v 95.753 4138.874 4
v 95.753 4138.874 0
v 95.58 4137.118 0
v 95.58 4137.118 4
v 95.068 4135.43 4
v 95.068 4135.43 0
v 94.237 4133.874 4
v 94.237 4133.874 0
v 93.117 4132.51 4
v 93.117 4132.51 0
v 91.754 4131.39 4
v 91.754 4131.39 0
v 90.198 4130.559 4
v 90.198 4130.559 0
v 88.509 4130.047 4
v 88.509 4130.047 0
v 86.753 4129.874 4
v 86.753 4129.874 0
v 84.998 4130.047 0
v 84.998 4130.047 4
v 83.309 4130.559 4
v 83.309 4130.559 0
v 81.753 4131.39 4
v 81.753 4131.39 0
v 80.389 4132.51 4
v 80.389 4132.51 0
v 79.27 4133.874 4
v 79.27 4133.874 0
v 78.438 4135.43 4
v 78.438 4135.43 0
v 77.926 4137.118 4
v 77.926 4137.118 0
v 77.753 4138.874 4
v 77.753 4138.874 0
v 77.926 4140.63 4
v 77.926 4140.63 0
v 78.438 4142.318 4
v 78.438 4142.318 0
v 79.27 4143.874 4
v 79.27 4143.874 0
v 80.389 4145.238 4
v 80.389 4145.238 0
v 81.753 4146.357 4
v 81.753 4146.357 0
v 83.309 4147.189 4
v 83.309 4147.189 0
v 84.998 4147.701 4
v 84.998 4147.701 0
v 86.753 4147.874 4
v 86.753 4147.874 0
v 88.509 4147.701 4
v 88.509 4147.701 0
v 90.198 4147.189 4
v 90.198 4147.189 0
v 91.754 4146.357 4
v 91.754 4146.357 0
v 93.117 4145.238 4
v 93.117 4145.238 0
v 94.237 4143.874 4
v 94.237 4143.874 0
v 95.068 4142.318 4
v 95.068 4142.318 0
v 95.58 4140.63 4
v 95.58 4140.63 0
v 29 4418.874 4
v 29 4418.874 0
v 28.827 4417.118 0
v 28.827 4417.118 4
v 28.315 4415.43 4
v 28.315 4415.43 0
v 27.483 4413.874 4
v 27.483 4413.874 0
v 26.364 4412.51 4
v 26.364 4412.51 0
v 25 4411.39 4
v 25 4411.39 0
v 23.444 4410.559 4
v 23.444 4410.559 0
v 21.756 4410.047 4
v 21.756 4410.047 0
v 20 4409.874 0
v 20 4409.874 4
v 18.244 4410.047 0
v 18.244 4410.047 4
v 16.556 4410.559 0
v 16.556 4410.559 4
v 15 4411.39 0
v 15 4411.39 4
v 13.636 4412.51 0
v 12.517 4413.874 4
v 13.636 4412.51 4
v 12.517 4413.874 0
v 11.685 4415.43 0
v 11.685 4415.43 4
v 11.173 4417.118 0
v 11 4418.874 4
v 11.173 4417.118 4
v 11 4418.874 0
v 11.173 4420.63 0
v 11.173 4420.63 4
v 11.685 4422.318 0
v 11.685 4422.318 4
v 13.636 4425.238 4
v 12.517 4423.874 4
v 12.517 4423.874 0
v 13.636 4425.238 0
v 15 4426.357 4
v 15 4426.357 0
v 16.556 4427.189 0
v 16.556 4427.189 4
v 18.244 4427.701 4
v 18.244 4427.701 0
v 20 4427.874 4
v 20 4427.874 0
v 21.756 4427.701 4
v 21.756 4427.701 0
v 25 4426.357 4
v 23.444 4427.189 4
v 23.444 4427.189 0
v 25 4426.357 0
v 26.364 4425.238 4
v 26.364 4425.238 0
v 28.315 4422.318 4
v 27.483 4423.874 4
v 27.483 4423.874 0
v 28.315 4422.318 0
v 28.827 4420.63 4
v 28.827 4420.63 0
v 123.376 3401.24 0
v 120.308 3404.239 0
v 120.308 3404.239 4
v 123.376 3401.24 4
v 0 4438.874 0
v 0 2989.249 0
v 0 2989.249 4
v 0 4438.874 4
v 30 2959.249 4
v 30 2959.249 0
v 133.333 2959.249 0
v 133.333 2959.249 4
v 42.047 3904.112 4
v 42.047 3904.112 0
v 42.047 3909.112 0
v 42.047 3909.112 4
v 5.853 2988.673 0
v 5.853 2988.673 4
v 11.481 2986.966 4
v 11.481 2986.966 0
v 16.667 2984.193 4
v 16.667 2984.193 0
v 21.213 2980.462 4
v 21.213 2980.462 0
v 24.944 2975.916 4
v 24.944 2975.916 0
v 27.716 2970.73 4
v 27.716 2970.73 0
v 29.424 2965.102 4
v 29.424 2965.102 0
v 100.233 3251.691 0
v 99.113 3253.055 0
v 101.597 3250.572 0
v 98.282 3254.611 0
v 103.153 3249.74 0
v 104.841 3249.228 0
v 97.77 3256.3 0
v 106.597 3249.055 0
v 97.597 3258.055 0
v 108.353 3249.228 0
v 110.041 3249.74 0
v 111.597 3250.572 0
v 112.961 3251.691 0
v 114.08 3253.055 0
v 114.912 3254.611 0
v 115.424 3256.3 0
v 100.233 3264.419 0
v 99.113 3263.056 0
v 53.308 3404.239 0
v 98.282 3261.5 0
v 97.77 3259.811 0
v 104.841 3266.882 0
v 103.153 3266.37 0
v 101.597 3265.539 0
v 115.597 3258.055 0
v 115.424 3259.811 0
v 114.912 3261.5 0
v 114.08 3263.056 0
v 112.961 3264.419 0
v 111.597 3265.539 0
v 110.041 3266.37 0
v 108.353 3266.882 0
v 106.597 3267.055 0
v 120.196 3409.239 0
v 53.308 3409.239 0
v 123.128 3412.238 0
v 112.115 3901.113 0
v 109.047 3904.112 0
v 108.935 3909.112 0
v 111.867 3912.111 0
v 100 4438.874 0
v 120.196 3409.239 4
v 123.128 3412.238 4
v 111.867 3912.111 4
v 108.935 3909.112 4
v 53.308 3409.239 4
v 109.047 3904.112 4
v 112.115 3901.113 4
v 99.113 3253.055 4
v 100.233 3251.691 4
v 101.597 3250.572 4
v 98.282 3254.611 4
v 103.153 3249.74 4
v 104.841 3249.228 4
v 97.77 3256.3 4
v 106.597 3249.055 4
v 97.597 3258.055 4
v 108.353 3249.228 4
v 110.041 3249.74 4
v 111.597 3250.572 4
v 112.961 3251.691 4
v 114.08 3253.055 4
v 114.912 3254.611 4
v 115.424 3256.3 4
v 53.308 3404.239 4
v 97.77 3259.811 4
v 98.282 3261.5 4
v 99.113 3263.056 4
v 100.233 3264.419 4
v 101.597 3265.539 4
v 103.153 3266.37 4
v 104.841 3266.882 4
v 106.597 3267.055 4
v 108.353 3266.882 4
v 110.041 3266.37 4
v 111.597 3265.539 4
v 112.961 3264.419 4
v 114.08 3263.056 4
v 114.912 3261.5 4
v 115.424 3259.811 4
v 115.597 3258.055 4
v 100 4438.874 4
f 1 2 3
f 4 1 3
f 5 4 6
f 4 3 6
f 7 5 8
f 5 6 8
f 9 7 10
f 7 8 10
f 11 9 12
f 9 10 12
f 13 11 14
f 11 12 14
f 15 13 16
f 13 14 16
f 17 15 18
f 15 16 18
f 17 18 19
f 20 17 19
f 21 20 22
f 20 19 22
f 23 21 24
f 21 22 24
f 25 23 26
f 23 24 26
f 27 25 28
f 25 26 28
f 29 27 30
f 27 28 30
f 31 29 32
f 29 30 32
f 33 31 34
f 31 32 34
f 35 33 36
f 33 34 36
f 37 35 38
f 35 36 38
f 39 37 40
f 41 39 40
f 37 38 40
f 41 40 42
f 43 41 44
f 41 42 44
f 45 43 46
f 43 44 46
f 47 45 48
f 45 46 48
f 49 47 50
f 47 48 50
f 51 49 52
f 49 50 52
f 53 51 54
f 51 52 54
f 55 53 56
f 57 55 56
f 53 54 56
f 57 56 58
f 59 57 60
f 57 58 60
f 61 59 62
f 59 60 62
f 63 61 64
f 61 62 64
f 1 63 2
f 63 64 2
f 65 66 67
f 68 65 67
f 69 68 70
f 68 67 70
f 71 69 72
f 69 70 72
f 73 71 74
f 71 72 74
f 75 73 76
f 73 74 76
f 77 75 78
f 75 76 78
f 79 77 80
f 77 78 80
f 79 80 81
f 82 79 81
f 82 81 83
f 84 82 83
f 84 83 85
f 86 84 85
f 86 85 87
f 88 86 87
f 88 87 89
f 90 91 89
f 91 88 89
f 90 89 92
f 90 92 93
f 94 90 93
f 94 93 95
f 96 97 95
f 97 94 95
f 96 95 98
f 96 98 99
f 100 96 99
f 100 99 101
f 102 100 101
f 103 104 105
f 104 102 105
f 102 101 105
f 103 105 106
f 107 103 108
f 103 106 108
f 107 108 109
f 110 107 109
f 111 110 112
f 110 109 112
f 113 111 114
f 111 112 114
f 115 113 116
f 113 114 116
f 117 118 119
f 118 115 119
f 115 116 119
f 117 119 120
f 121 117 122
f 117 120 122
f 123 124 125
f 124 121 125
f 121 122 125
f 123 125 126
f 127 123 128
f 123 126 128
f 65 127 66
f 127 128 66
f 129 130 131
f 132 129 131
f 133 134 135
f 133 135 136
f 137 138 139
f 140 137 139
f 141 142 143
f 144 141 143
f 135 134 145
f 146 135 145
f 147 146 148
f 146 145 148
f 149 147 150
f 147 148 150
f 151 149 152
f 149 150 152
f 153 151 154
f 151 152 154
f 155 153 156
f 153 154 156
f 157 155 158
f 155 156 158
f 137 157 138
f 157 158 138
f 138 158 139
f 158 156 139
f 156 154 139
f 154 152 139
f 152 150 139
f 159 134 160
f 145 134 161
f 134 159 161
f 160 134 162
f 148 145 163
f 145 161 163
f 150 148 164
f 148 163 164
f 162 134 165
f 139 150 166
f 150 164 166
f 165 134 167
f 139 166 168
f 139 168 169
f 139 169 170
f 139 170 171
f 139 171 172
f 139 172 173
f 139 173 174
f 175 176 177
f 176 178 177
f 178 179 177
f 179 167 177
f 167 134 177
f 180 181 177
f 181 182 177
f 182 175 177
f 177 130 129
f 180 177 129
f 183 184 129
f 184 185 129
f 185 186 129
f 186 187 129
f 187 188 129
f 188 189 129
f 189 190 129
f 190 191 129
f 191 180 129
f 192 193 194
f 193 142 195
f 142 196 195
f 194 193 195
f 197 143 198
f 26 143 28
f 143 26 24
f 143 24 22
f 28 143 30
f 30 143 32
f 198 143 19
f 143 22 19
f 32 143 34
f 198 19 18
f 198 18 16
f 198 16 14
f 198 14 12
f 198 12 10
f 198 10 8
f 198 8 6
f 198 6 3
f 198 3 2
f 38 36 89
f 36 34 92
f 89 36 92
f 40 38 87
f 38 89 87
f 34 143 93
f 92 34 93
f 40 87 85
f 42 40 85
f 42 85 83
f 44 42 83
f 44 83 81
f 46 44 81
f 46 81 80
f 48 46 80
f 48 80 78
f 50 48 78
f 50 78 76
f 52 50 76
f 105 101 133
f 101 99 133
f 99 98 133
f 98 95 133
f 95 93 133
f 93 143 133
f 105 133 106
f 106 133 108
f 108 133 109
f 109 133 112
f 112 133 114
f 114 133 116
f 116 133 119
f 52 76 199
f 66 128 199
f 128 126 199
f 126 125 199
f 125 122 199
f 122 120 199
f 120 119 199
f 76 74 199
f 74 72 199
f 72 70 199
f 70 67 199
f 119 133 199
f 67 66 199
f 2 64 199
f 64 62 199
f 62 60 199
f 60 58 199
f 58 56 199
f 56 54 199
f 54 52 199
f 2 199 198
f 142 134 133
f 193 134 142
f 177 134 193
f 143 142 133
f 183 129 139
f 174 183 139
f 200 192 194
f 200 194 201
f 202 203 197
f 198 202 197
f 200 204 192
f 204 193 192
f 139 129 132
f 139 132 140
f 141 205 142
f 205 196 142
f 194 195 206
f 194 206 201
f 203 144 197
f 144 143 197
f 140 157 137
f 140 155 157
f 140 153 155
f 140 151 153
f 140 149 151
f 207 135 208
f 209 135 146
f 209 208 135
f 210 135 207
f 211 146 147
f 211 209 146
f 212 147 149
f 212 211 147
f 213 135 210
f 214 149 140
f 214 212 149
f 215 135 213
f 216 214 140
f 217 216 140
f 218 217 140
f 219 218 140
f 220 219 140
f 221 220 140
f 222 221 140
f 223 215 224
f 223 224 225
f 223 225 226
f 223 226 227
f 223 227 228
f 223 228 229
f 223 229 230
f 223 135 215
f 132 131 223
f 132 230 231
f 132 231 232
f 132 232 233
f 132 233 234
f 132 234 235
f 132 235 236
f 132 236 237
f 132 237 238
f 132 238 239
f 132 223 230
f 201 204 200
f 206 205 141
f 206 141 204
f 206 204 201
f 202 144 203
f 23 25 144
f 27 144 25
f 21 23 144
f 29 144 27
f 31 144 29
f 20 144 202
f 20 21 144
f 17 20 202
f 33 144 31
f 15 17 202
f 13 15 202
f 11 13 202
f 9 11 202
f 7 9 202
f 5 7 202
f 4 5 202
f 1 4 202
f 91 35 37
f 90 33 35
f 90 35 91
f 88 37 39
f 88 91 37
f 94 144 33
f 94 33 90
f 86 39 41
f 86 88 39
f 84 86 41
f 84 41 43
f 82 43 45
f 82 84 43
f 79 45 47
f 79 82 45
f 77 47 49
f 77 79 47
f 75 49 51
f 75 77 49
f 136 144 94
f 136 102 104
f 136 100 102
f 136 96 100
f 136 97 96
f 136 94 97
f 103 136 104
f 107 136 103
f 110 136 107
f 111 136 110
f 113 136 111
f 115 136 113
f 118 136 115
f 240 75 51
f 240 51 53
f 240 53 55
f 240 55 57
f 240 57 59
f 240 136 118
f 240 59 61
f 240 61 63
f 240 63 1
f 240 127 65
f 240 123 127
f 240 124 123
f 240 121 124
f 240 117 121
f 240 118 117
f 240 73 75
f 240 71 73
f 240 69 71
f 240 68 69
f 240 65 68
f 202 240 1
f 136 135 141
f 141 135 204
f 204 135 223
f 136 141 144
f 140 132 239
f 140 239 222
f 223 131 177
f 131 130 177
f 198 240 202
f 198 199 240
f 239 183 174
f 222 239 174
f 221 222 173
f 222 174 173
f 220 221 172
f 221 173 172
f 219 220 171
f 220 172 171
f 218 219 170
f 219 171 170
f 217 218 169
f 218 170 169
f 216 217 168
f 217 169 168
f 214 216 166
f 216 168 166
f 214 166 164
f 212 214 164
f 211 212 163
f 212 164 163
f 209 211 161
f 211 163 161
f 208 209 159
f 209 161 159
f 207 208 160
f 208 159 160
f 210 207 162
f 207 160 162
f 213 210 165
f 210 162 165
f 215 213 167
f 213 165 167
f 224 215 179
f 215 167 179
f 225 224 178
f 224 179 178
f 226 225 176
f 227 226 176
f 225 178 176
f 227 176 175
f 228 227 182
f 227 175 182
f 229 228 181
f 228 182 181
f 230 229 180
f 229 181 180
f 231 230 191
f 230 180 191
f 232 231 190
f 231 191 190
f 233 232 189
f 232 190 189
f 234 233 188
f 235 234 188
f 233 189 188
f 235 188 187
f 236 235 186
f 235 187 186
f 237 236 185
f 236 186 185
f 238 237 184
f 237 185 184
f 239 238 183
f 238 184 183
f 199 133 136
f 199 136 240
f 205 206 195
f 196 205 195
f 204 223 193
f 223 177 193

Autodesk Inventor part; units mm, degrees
ref_plane "YZ Plane" through (0, 0, 0) normal (1, 0, 0) x (0, 1, 0)
ref_plane "XZ Plane" through (0, 0, 0) normal (0, 1, 0) x (-1, 0, 0)
ref_plane "XY Plane" through (0, 0, 0) normal (0, 0, 1) x (1, 0, 0)
sketch "Sketch1" plane through (0, 0, 0) normal (0, 0, 1) x (1, 0, 0)
  line L0 (0, 0) -> (0, 4438.8737)
  line L1 (0, 4438.8737) -> (100, 4438.8737)
  line L2 (100, 4438.8737) -> (200, 0)
  line L3 (200, 0) -> (0, 0)
  circle A0 centre (0, 0) radius 30
  line L4 (0, 1479.6246) -> (166.6667, 1479.6246)
  line L5 (0, 2959.2492) -> (133.3333, 2959.2492)
  circle A1 centre (0, 1479.6246) radius 30
  circle A2 centre (0, 2959.2492) radius 30
  line L6 (190.8761, 405) -> (120.8761, 405)
  line L7 (120.8761, 405) -> (120.8761, 410)
  line L8 (120.8761, 410) -> (190.8761, 410)
  line L9 (190.8761, 410) -> (190.8761, 405)
  line L10 (109.6148, 909.8732) -> (179.6148, 909.8732)
  line L11 (179.6148, 904.8732) -> (109.6148, 904.8732)
  line L12 (109.6148, 904.8732) -> (109.6148, 909.8732)
  line L13 (179.6148, 909.8732) -> (179.6148, 904.8732)
  line L14 (98.3535, 1409.7463) -> (168.3535, 1409.7463)
  line L15 (168.3535, 1404.7463) -> (98.3535, 1404.7463)
  line L16 (98.3535, 1404.7463) -> (98.3535, 1409.7463)
  line L17 (168.3535, 1409.7463) -> (168.3535, 1404.7463)
  line L18 (87.0923, 1909.6195) -> (157.0923, 1909.6195)
  line L19 (157.0923, 1904.6195) -> (87.0923, 1904.6195)
  line L20 (87.0923, 1904.6195) -> (87.0923, 1909.6195)
  line L21 (157.0923, 1909.6195) -> (157.0923, 1904.6195)
  line L22 (75.831, 2409.4927) -> (145.831, 2409.4927)
  line L23 (145.831, 2404.4927) -> (75.831, 2404.4927)
  line L24 (75.831, 2404.4927) -> (75.831, 2409.4927)
  line L25 (145.831, 2409.4927) -> (145.831, 2404.4927)
  line L26 (64.5698, 2909.3658) -> (134.5698, 2909.3658)
  line L27 (134.5698, 2904.3658) -> (64.5698, 2904.3658)
  line L28 (64.5698, 2904.3658) -> (64.5698, 2909.3658)
  line L29 (134.5698, 2909.3658) -> (134.5698, 2904.3658)
  line L30 (53.3085, 3409.239) -> (123.3085, 3409.239)
  line L31 (123.3085, 3404.239) -> (53.3085, 3404.239)
  line L32 (53.3085, 3404.239) -> (53.3085, 3409.239)
  line L33 (123.3085, 3409.239) -> (123.3085, 3404.239)
  line L34 (42.0472, 3909.1122) -> (112.0472, 3909.1122)
  line L35 (112.0472, 3904.1122) -> (42.0472, 3904.1122)
  line L36 (42.0472, 3904.1122) -> (42.0472, 3909.1122)
  line L37 (112.0472, 3909.1122) -> (112.0472, 3904.1122)
  line L38 (0, 1629.6246) -> (163.2874, 1629.6246)
  line L39 (0, 3079.2492) -> (130.6299, 3079.2492)
  circle A3 centre (20, 4418.8737) radius 9
  circle A4 centre (106.5967, 3258.0554) radius 9
  circle A5 centre (86.7534, 4138.8737) radius 9
  line L40 (86.7534, 4138.8737) -> (106.5967, 3258.0554)
  point P0 (30, 2959.2492)
  point P1 (0, 2929.2492)
  point P2 (0, 1509.6246)
  point P3 (0, 1449.6246)
  point P4 (0, 30)
  point P5 (30, 0)
  point P6 (190.7634, 410)
  point P7 (179.5022, 909.8732)
  point P8 (168.3535, 1404.7463)
  point P9 (168.2409, 1409.7463)
  point P10 (30, 1479.6246)
  point P11 (157.0923, 1904.6195)
  point P12 (156.9796, 1909.6195)
  point P13 (145.831, 2404.4927)
  point P14 (145.7184, 2409.4927)
  point P15 (134.5698, 2904.3658)
  point P16 (134.4571, 2909.3658)
  point P17 (0, 2989.2492)
  point P18 (123.3085, 3404.239)
  point P19 (123.1959, 3409.239)
  point P20 (112.0472, 3904.1122)
  point P21 (111.9346, 3909.1122)
  dimension "d65" = 100
  dimension "d67" = 200
  dimension "d68" = 60
  dimension "d69" = 1480
  dimension "d70" = 1480
  dimension "d71" = 1480
  dimension "d72" = 5
  dimension "d73" = 70
  dimension "d74" = 410
  dimension "d77" = 500
  dimension "d82" = 120
  dimension "d83" = 150
  dimension "d88" = 18
  dimension "d91" = 20
  dimension "d92" = 20
  dimension "d93" = 20
  dimension "d94" = 300
  dimension "d95" = 300
extrude "Plate3" add sketch "Sketch1" along normal blind 4 contours L39 L2 L5 A2 L0 | L0 L1 L2 L34 L36 L35 L40 L30 L32 L31 L39 | L30 L40 L35 L2
chamfer "Corner Chamfer2" distance 3 angle 45 4 edges at (123.3085, 3404.239, 2) (123.1959, 3409.239, 2) (112.0472, 3904.1122, 2) (111.9346, 3909.1122, 2)
equation "\"BendRadius\" = Thickness"
equation "\"BendReliefWidth\" = Thickness"
equation "\"BendReliefDepth\" = 0.5 * Thickness"
equation "\"CornerReliefSize\" = 4 * Thickness"
equation "\"MinimumRemnant\" = 2 * Thickness"
equation "\"TransitionRadius\" = BendRadius"
equation "\"JacobiRadiusSize\" = BendRadius"
equation "\"GapSize\" = Thickness"
equation "\"Thickness\" = 4"
properties part number "GBK 3311 central third rib" material "Steel"
